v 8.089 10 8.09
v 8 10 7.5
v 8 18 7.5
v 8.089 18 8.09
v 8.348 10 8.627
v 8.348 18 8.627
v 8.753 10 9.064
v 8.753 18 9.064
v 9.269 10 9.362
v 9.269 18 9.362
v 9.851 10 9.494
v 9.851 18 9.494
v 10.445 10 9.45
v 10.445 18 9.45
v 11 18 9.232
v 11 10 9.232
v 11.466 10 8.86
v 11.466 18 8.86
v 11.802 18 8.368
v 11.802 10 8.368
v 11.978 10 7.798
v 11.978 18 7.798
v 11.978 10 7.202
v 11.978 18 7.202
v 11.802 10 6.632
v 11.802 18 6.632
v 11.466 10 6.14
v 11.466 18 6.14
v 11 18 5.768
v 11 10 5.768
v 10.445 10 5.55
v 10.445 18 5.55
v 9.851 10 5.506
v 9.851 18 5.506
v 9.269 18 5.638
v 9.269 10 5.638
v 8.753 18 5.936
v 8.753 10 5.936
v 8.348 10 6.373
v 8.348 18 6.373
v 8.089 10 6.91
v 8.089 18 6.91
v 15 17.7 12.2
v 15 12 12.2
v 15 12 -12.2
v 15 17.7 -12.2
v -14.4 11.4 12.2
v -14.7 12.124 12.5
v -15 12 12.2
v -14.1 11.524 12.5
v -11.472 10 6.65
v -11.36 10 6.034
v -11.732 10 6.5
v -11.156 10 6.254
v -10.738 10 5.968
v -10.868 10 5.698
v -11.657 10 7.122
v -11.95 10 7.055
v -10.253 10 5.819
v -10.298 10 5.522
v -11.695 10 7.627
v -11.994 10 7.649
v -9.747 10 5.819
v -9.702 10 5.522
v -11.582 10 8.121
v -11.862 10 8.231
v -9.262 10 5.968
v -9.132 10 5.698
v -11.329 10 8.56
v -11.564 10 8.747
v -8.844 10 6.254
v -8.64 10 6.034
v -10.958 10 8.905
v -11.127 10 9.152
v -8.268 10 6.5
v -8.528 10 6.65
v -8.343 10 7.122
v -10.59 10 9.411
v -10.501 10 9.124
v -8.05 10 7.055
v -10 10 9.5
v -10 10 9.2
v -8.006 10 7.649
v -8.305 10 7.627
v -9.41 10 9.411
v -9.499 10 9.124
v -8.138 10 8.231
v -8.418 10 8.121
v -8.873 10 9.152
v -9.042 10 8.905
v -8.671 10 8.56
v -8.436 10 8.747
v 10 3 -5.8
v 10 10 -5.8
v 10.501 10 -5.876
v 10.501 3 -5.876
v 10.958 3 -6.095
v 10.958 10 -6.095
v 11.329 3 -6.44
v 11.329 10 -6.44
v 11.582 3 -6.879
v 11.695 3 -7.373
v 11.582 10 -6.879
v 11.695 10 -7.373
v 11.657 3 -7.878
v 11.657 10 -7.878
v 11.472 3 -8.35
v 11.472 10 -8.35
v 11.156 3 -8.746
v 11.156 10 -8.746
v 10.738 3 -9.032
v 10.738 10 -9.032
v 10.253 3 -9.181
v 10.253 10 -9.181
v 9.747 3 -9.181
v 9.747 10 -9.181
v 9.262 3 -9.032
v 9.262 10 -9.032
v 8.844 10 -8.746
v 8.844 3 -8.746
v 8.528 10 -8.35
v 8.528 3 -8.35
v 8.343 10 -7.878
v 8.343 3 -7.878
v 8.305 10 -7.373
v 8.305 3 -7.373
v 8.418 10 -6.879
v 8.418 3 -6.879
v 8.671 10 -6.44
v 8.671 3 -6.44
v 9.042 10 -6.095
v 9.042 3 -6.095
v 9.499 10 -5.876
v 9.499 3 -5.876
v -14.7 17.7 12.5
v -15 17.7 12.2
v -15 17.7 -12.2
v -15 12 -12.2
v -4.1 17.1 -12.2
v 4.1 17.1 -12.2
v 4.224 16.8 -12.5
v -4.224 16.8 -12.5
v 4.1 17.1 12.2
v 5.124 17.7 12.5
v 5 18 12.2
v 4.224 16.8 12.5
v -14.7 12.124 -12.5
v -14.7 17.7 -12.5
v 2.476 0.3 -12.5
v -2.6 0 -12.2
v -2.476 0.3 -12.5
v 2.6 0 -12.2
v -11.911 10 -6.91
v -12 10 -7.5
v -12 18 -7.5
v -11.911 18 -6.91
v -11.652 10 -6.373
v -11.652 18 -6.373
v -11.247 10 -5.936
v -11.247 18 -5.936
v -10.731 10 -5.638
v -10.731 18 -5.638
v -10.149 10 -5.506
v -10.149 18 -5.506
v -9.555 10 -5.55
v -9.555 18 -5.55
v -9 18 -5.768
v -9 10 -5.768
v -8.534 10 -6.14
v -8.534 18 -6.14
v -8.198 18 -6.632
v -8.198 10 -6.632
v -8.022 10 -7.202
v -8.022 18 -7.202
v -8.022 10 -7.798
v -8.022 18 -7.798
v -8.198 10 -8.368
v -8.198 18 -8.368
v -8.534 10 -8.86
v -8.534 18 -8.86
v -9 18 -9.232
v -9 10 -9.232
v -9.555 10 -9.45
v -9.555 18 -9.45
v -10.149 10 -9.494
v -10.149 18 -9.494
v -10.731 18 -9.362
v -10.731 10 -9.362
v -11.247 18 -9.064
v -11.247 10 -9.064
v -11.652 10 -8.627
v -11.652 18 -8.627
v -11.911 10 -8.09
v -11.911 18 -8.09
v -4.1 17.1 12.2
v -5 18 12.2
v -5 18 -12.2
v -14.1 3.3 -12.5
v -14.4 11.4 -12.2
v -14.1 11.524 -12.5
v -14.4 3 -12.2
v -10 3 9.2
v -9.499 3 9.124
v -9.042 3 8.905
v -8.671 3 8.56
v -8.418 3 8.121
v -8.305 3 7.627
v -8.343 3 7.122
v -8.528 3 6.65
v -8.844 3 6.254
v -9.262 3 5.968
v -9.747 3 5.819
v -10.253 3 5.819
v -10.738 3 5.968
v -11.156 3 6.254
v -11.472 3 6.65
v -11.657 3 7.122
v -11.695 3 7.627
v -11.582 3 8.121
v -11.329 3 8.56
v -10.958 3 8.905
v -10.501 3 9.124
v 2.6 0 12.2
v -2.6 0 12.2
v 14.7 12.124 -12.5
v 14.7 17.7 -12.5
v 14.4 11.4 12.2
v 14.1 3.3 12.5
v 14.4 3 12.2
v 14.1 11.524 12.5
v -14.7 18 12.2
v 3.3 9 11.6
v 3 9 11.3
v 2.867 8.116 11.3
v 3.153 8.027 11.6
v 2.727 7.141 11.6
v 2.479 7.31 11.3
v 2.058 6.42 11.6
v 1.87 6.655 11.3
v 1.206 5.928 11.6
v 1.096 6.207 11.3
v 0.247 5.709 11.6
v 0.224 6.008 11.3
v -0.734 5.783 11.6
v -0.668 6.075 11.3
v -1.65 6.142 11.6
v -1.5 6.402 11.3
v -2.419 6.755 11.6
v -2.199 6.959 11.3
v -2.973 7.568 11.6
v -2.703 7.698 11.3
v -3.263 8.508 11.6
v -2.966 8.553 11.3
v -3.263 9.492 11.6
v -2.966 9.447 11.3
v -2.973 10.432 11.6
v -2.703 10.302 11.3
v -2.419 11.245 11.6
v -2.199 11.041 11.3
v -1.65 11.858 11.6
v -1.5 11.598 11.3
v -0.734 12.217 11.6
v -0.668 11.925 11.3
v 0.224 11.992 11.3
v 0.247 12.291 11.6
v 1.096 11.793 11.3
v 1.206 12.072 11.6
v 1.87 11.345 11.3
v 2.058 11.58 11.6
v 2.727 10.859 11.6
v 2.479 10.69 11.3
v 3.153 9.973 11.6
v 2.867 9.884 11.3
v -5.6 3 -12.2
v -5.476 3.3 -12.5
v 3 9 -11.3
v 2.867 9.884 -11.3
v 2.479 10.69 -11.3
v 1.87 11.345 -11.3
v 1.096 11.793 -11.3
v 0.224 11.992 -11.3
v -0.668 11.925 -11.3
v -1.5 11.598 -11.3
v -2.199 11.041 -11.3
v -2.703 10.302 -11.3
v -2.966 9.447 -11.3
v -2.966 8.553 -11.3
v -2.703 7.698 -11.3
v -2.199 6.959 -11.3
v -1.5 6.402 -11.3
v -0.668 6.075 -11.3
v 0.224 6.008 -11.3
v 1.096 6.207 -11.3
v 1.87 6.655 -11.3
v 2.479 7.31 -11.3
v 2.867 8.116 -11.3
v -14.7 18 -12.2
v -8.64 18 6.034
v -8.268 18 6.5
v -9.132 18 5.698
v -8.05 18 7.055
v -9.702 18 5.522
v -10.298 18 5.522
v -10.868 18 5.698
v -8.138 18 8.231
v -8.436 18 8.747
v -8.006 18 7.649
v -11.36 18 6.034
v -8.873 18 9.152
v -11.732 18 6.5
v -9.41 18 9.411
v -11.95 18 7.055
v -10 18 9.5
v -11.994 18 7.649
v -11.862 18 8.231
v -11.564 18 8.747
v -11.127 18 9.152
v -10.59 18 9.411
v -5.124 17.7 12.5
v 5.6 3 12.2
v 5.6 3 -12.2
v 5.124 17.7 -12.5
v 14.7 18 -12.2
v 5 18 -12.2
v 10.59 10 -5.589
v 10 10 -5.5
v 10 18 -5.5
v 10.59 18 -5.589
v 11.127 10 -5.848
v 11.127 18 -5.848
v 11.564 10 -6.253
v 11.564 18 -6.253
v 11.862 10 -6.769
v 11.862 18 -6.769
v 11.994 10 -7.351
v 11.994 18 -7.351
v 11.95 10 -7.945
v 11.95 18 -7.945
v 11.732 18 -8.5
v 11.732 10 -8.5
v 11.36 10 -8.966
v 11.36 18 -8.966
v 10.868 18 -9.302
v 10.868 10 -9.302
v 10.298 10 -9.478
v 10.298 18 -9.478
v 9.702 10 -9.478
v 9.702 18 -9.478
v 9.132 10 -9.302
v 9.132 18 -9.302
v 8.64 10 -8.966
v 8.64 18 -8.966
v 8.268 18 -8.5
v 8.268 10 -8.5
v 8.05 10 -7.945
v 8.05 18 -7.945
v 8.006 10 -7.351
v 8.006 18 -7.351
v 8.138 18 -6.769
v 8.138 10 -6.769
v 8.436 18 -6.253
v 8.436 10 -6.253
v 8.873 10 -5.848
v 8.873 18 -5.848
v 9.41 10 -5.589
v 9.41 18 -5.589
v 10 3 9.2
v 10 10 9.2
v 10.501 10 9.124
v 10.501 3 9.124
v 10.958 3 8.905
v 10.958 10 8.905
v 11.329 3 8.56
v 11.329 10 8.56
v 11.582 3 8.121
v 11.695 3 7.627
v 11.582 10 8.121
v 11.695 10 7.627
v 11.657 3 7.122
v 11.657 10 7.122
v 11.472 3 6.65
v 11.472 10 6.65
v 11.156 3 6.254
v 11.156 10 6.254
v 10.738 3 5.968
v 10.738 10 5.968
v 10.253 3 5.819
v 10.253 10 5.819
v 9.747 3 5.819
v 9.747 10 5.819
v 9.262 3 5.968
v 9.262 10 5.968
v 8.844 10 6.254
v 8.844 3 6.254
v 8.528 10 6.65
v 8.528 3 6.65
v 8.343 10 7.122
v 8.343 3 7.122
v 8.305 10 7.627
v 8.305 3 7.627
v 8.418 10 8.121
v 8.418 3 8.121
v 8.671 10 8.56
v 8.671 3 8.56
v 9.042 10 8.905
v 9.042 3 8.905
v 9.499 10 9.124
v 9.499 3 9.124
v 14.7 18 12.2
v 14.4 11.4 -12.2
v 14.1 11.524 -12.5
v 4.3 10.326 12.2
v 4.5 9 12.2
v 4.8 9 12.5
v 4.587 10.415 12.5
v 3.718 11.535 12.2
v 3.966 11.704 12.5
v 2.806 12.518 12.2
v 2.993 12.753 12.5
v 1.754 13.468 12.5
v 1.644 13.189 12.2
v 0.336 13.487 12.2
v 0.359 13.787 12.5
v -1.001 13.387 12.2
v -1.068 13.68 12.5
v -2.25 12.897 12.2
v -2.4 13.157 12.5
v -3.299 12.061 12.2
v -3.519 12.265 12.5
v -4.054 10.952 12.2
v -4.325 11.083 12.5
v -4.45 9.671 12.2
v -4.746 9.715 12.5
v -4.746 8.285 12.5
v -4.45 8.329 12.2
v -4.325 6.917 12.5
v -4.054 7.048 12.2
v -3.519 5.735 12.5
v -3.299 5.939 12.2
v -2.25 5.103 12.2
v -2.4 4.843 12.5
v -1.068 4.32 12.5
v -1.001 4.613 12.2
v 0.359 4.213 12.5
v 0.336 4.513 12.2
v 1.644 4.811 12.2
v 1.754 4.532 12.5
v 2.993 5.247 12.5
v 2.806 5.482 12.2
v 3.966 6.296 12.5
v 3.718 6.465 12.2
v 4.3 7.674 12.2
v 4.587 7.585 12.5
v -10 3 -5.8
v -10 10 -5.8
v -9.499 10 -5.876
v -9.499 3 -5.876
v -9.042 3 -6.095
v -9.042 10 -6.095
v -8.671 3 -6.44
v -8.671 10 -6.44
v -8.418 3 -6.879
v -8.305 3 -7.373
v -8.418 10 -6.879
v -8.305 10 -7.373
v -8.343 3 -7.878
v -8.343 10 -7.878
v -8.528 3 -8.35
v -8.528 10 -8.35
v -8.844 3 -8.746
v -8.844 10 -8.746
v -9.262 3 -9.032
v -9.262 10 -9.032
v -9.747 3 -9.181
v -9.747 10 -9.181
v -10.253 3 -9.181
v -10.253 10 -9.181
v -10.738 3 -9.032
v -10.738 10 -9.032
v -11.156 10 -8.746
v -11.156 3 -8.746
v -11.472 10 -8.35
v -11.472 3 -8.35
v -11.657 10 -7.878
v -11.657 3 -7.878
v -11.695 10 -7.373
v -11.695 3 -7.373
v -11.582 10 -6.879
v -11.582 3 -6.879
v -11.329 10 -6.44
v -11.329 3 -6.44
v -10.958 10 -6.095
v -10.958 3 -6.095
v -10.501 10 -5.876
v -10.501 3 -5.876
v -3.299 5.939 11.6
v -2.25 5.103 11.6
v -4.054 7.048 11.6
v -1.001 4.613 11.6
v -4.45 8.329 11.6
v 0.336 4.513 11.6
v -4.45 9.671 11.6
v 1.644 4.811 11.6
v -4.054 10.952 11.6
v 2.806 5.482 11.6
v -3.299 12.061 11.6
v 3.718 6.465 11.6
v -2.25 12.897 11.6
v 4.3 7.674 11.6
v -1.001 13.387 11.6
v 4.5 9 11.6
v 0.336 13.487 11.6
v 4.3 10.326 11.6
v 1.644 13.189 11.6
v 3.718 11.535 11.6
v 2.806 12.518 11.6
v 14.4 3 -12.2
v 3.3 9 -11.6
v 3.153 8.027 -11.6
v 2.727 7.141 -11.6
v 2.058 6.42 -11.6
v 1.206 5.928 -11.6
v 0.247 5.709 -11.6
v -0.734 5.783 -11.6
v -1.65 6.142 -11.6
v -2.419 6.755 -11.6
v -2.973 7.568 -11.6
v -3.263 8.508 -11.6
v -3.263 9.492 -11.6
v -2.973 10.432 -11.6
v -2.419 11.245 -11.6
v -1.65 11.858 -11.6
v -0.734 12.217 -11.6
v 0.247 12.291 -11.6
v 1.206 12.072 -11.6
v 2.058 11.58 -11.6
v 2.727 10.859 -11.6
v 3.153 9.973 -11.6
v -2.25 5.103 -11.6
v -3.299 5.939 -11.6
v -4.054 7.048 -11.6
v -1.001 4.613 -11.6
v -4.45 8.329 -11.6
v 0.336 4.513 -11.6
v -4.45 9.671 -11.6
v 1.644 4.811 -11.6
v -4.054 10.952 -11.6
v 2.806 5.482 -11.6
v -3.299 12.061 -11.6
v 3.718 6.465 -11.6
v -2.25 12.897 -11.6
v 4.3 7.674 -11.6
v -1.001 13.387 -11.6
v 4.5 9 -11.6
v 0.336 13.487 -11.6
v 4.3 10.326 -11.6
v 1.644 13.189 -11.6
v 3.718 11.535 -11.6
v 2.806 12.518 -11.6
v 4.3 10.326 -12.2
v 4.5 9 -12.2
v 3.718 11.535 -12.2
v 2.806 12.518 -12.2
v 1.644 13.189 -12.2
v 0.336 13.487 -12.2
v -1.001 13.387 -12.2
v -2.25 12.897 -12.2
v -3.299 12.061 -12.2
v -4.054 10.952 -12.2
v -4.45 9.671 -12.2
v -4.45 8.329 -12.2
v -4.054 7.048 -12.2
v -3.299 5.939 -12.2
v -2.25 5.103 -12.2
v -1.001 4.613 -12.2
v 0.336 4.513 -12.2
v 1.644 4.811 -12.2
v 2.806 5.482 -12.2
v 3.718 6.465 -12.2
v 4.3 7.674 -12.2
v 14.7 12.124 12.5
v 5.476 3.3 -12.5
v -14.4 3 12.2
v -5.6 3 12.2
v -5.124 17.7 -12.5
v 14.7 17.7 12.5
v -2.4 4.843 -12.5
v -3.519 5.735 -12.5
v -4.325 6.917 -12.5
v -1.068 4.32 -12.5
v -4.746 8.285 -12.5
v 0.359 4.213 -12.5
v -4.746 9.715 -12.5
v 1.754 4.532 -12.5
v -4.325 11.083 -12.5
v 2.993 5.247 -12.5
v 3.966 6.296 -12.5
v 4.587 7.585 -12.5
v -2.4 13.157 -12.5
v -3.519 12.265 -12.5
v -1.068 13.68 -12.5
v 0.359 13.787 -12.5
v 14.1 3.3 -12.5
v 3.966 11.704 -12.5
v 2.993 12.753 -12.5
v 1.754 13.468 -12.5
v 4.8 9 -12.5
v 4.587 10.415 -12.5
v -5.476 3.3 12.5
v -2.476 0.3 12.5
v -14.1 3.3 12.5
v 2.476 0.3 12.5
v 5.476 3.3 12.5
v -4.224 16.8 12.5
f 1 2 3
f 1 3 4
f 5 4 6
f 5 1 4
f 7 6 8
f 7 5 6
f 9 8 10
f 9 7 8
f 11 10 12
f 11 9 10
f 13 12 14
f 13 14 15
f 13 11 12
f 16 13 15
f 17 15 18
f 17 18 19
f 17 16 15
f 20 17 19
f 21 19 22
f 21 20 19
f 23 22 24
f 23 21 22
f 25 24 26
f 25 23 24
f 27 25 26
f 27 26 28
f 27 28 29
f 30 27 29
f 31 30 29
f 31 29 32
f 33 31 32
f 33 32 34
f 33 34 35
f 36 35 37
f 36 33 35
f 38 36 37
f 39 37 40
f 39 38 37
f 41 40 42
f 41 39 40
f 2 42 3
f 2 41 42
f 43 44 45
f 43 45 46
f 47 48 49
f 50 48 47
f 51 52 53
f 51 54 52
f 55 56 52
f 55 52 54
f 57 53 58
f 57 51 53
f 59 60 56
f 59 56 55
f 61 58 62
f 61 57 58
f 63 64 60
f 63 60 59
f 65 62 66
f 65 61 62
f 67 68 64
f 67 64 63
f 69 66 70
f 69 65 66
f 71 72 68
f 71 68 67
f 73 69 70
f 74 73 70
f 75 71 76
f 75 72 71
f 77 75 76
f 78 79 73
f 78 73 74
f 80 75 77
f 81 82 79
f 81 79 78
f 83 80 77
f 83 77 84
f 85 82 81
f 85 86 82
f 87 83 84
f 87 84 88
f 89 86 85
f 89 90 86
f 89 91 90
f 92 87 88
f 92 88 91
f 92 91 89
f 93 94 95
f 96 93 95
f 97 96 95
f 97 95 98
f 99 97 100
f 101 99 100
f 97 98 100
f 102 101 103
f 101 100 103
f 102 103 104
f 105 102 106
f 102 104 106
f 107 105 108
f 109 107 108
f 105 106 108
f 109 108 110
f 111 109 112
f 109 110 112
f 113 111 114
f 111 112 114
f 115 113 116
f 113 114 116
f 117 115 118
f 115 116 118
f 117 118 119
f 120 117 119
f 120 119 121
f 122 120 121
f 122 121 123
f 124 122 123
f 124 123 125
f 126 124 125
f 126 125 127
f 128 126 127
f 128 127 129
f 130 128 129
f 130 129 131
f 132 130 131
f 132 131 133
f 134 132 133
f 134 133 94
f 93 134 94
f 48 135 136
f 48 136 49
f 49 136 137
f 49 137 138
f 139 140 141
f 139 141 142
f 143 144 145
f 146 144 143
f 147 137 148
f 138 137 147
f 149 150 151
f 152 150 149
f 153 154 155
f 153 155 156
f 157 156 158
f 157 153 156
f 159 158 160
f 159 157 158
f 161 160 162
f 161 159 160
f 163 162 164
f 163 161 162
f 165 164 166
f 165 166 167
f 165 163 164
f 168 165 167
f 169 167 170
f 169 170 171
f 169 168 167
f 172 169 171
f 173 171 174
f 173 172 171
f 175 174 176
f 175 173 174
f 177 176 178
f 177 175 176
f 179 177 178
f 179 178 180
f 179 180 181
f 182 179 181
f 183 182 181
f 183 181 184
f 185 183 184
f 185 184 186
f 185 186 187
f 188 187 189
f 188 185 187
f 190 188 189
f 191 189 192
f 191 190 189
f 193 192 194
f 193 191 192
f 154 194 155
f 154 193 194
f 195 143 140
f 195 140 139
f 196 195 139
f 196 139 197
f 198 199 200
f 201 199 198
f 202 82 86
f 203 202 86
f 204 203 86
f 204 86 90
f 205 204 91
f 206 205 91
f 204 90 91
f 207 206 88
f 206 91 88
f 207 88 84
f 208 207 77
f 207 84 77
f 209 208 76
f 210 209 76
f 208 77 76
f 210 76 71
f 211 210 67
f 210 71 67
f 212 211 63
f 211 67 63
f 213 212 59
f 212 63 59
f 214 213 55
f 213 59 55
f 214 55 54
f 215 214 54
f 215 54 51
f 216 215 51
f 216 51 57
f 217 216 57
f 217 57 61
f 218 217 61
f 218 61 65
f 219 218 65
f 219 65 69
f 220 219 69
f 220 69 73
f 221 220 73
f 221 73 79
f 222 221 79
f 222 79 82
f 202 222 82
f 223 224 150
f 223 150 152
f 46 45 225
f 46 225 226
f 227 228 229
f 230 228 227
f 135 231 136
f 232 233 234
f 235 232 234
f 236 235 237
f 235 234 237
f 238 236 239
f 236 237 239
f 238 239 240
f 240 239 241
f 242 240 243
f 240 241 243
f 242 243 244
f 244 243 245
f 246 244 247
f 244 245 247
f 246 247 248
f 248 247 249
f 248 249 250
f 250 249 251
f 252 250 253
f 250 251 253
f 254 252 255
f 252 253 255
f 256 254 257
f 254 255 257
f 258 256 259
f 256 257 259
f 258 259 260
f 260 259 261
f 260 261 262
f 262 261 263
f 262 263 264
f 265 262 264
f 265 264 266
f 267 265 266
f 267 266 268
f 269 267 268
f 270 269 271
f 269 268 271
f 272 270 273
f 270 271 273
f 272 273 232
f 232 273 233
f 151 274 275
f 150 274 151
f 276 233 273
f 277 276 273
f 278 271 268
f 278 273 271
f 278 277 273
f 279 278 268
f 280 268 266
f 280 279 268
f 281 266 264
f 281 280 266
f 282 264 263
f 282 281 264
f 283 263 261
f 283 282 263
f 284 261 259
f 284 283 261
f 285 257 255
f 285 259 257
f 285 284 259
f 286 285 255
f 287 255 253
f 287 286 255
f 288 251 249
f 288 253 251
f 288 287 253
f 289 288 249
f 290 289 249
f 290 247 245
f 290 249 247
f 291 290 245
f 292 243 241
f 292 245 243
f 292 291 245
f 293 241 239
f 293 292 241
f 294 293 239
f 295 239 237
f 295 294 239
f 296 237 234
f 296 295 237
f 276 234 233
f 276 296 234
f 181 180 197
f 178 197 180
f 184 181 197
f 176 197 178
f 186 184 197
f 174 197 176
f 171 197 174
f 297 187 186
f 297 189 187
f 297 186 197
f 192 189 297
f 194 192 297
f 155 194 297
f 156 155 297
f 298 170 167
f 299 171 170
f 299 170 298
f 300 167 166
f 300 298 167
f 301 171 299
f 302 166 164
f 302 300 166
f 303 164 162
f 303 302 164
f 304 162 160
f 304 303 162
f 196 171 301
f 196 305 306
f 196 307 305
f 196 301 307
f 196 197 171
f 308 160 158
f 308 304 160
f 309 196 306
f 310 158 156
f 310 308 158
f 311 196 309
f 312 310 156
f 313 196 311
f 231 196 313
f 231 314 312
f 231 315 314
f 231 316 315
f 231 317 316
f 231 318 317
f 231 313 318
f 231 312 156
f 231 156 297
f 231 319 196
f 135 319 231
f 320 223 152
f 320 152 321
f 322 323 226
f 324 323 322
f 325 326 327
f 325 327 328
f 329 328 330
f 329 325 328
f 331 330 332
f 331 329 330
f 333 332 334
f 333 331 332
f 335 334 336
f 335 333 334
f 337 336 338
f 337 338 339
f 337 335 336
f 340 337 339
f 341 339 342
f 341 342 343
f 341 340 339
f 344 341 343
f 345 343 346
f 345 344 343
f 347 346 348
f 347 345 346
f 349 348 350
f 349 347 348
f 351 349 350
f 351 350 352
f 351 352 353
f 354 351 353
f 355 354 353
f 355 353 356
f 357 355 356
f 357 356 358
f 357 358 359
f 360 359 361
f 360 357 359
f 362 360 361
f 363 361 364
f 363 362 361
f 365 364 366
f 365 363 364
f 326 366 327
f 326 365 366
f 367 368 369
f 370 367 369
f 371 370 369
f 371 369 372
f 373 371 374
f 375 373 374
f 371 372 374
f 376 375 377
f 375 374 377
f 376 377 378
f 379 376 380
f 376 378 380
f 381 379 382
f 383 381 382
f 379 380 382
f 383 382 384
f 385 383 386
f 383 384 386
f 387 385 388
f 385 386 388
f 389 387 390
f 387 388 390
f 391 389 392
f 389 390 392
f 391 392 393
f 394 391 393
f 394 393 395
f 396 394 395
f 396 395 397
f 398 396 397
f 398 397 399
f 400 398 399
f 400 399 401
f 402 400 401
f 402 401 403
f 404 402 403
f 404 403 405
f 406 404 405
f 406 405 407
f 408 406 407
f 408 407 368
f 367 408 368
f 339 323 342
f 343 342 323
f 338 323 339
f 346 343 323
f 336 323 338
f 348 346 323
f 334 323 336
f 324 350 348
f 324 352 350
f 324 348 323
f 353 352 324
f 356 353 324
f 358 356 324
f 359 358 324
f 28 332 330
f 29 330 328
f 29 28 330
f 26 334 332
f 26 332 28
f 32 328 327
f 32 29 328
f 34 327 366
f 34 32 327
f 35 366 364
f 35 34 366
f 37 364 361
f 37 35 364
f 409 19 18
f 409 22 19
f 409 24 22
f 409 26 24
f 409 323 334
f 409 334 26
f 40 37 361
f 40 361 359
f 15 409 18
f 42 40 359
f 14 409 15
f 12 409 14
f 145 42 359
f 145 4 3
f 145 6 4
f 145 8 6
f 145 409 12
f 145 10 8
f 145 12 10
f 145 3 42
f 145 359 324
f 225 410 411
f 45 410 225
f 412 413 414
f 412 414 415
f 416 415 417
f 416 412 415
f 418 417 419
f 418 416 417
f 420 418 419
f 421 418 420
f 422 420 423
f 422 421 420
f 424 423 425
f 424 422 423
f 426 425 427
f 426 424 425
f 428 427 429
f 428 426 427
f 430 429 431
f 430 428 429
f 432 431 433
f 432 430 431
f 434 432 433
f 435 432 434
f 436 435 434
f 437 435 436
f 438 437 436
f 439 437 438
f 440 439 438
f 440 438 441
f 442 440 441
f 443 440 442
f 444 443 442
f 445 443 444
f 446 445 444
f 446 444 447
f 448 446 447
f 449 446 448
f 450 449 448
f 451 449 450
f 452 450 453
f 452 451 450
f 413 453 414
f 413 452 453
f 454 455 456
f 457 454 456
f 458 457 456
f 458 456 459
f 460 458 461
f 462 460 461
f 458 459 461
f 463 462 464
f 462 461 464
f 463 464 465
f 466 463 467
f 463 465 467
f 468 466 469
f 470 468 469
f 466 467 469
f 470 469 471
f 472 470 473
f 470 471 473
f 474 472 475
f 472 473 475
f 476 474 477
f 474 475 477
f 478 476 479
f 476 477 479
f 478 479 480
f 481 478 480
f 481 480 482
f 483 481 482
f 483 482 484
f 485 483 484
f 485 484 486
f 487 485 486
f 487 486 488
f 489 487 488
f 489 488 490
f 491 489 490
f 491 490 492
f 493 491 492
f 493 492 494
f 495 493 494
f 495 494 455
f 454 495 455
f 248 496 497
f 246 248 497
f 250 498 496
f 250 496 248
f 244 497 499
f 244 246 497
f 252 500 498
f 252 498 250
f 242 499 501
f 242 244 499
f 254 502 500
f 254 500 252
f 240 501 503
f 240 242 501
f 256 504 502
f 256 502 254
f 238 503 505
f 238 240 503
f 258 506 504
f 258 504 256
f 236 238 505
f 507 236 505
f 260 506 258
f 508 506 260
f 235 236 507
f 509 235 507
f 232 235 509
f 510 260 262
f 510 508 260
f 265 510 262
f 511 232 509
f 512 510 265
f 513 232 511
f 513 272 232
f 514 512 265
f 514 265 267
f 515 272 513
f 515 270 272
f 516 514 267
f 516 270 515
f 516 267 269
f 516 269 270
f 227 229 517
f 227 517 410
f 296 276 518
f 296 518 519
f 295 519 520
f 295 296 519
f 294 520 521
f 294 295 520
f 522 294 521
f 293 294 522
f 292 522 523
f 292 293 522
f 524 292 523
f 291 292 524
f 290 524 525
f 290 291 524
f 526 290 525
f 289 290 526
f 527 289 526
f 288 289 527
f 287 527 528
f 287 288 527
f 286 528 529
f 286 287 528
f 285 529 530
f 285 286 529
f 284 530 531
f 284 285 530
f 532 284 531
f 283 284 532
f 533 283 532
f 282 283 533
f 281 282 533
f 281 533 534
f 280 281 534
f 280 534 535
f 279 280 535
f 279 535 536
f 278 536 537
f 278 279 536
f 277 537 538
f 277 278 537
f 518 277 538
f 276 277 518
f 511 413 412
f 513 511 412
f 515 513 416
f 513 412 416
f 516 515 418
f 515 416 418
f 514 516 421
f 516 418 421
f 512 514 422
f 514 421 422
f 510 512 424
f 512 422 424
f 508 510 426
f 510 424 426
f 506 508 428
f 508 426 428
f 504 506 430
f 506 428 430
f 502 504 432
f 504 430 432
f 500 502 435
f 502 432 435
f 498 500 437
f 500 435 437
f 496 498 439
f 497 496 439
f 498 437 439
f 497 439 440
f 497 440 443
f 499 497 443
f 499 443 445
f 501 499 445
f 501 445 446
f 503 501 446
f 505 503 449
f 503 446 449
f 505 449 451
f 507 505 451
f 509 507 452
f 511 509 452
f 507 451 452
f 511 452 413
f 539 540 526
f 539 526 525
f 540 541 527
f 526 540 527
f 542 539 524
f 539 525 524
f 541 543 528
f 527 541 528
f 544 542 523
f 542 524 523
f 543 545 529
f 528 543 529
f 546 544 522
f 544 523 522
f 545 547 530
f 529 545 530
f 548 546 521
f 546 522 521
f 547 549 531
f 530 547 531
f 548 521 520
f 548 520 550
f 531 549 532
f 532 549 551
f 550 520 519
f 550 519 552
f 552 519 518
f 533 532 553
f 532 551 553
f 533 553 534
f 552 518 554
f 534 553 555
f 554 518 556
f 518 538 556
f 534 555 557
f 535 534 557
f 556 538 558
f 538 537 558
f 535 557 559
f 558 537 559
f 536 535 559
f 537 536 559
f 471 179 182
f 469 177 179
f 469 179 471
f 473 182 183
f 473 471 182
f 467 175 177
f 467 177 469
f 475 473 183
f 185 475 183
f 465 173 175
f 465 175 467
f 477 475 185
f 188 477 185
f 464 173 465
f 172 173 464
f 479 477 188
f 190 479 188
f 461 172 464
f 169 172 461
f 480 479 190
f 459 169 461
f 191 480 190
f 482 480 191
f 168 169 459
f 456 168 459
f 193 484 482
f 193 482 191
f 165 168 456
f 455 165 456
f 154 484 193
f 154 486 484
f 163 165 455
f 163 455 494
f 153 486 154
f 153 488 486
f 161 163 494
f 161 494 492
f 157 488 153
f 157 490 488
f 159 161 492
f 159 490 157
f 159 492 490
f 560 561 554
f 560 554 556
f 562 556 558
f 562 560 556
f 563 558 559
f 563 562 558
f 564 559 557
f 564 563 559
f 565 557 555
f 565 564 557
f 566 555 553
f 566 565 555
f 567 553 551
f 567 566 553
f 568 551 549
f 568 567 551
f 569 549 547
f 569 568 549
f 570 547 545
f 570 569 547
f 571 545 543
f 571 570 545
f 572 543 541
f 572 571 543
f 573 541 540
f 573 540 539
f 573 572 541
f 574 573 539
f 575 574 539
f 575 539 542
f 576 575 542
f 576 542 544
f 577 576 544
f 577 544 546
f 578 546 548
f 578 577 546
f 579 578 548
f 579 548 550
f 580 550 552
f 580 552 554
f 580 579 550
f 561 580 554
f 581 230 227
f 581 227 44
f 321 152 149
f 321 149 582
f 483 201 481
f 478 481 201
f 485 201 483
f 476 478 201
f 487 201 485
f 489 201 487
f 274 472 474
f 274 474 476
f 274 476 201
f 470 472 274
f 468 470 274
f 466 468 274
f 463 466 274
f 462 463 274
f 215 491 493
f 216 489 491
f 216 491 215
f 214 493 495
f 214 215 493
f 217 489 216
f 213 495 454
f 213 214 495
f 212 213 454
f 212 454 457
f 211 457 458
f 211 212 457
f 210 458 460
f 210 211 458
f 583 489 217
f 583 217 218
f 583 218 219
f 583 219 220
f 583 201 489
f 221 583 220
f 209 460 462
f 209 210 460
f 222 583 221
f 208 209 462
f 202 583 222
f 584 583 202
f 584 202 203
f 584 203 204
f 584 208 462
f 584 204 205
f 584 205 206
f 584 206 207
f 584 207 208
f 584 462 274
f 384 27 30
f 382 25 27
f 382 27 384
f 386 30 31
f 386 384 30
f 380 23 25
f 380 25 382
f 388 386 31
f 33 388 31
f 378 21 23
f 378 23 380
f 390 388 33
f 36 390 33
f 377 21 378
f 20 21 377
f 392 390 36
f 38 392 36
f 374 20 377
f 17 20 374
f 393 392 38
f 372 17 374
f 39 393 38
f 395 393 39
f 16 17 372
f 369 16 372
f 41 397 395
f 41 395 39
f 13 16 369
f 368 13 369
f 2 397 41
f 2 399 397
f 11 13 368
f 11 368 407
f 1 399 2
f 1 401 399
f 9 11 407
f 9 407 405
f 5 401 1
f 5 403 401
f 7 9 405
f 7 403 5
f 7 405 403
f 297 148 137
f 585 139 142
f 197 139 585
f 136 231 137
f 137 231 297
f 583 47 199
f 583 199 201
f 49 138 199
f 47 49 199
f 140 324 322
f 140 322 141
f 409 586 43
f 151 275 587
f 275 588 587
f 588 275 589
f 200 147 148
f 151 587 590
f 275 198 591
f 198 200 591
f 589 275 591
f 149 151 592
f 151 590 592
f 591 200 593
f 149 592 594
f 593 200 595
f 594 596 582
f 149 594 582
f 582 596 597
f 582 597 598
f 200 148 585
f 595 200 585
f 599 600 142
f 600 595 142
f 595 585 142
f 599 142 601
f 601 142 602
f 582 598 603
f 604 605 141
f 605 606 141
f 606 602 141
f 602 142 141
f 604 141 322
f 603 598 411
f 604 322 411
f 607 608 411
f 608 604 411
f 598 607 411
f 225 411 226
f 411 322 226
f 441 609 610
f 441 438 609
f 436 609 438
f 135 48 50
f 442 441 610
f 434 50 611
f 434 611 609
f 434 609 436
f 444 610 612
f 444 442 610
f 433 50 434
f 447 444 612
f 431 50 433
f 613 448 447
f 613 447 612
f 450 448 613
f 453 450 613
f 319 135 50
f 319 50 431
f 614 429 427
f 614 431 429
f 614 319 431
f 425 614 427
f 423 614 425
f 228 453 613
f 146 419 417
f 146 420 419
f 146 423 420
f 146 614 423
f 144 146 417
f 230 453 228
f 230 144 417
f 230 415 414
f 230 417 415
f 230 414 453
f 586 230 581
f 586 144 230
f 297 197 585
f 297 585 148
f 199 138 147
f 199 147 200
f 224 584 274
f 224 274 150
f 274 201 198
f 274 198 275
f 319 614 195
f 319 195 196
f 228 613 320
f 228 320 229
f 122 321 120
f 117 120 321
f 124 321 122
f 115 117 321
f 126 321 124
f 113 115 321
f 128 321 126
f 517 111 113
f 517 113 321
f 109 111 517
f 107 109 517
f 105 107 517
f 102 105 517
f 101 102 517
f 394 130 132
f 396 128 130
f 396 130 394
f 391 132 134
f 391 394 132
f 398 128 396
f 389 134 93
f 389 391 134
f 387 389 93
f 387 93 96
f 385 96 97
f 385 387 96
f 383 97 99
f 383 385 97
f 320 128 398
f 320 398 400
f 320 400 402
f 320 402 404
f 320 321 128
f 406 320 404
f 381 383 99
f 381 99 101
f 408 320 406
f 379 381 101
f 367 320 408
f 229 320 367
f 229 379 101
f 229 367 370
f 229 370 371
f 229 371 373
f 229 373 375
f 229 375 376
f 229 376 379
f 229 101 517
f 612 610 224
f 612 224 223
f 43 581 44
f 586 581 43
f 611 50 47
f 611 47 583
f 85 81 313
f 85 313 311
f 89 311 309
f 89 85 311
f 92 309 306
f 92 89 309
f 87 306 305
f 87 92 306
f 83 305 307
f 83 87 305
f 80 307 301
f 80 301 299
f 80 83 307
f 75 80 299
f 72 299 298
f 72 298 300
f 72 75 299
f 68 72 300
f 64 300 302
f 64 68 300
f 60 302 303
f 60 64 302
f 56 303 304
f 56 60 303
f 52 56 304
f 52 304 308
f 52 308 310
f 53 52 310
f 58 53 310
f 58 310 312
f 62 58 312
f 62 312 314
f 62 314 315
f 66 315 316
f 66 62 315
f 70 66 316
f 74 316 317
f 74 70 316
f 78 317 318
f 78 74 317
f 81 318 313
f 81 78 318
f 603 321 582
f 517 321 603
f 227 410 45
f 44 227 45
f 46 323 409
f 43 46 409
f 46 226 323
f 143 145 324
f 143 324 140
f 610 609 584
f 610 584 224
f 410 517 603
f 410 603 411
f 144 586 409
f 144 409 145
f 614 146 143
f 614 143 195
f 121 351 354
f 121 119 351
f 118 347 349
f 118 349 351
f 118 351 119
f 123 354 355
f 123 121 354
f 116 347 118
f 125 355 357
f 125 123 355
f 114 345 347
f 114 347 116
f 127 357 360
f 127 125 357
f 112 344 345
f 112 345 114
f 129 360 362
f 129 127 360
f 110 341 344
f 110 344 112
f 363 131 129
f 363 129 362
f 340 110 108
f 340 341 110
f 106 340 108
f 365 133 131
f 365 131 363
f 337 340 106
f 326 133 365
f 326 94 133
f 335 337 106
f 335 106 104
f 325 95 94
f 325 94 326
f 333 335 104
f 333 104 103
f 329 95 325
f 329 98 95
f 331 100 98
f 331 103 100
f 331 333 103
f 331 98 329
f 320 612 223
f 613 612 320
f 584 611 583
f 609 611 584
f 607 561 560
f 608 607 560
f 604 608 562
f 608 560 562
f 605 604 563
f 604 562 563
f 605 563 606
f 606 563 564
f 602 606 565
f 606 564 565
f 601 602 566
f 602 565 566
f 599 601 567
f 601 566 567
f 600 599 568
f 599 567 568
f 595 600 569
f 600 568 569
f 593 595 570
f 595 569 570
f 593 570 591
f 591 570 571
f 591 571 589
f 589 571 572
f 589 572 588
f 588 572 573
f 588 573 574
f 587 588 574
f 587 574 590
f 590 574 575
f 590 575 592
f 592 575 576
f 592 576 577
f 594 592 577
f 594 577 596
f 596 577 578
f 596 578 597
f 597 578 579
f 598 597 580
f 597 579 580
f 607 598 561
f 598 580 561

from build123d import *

# Parameters (mm, degrees)
SKETCH1_R           = 3
BOSS_EXTRUDE1_DEPTH = 12.5
SKETCH6_R           = 4.5
CUT_EXTRUDE2_DEPTH  = 0.9
CHAMFER2_SIZE       = 0.3
CHAMFER1_SIZE       = 0.3
CUT_EXTRUDE3_START  = -8
SKETCH7_R           = 2
CUT_EXTRUDE3_DEPTH  = 8
SKETCH13_R          = 1.7
CUT_EXTRUDE4_DEPTH  = 19


with BuildPart() as part:
    # Sketch1 → Boss-Extrude1 (new body, symmetric)
    with BuildSketch(Plane.XY):
        Polygon((-2.6, 0), (2.6, 0), (5.6, 3), (14.4, 3), (14.4, 11.4), (15, 12), (15, 18), (5, 18), (4.1, 17.1), (-4.1, 17.1), (-5, 18), (-15, 18), (-15, 12), (-14.4, 11.4), (-14.4, 3), (-5.6, 3), align=None)
        with Locations((0, 9)):
            Circle(SKETCH1_R, mode=Mode.SUBTRACT)
    extrude(amount=BOSS_EXTRUDE1_DEPTH, both=True)

    # Sketch6 → Cut-Extrude2 (cut)
    with BuildSketch(Plane.XY.offset(12.5)):
        with Locations((0, 9)):
            Circle(SKETCH6_R)
    cut_extrude2 = extrude(amount=-CUT_EXTRUDE2_DEPTH, mode=Mode.SUBTRACT)

    # Mirror3: Cut-Extrude2 across plane
    add(cut_extrude2.mirror(Plane.XY), mode=Mode.SUBTRACT)

    # Chamfer2
    chamfer2_edges = [part.edges().sort_by_distance(p)[0] for p in [
        (-3, 9, 11.6),
        (-4.5, 9, 12.5),
        (-4.5, 9, -12.5),
        (-3, 9, -11.6),
    ]]
    chamfer(chamfer2_edges, length=CHAMFER2_SIZE)

    # Chamfer1
    chamfer1_edges = [part.edges().sort_by_distance(p)[0] for p in [
        (4.1, 1.5, 12.5),
        (10, 3, 12.5),
        (-10, 3, -12.5),
        (-14.4, 7.2, -12.5),
        (-14.7, 11.7, -12.5),
        (-15, 15, -12.5),
        (-10, 18, -12.5),
        (14.4, 7.2, 12.5),
        (-4.55, 17.55, -12.5),
        (0, 17.1, -12.5),
        (4.55, 17.55, -12.5),
        (10, 18, -12.5),
        (15, 15, -12.5),
        (14.7, 11.7, -12.5),
        (14.4, 7.2, -12.5),
        (10, 3, -12.5),
        (14.7, 11.7, 12.5),
        (4.1, 1.5, -12.5),
        (0, 0, -12.5),
        (-4.1, 1.5, -12.5),
        (15, 15, 12.5),
        (10, 18, 12.5),
        (-15, 18, 0),
        (15, 18, 0),
        (4.55, 17.55, 12.5),
        (0, 17.1, 12.5),
        (-4.55, 17.55, 12.5),
        (-10, 18, 12.5),
        (-4.1, 1.5, 12.5),
        (-15, 15, 12.5),
        (-14.7, 11.7, 12.5),
        (-14.4, 7.2, 12.5),
        (-10, 3, 12.5),
        (0, 0, 12.5),
    ]]
    chamfer(chamfer1_edges, length=CHAMFER1_SIZE)

    # Sketch7 → Cut-Extrude3 (cut)
    with BuildSketch(Plane(origin=(0, 18, 0), x_dir=(1, 0, 0), z_dir=(0, 1, 0)).offset(CUT_EXTRUDE3_START)):
        with Locations(Location((10, -7.5, 0), (0, 0, 180))):  # turned: the seam where the file's is
            Circle(SKETCH7_R)
        with Locations(Location((10, 7.5, 0), (0, 0, 270))):  # turned: the seam where the file's is
            Circle(SKETCH7_R)
        with Locations(Location((-10, -7.5, 0), (0, 0, 270))):  # turned: the seam where the file's is
            Circle(SKETCH7_R)
        with Locations(Location((-10, 7.5, 0), (0, 0, 180))):  # turned: the seam where the file's is
            Circle(SKETCH7_R)
    extrude(amount=CUT_EXTRUDE3_DEPTH, mode=Mode.SUBTRACT)

    # Sketch13 → Cut-Extrude4 (cut, through all)
    with BuildSketch(Plane(origin=(0, 18, 0), x_dir=(1, 0, 0), z_dir=(0, 1, 0))):
        with Locations(Location((10, -7.5, 0), (0, 0, 270))):  # turned: the seam where the file's is
            Circle(SKETCH13_R)
        with Locations(Location((10, 7.5, 0), (0, 0, 270))):  # turned: the seam where the file's is
            Circle(SKETCH13_R)
        with Locations(Location((-10, -7.5, 0), (0, 0, 270))):  # turned: the seam where the file's is
            Circle(SKETCH13_R)
        with Locations(Location((-10, 7.5, 0), (0, 0, 270))):  # turned: the seam where the file's is
            Circle(SKETCH13_R)
    extrude(amount=-CUT_EXTRUDE4_DEPTH, mode=Mode.SUBTRACT)


solid = part.part
